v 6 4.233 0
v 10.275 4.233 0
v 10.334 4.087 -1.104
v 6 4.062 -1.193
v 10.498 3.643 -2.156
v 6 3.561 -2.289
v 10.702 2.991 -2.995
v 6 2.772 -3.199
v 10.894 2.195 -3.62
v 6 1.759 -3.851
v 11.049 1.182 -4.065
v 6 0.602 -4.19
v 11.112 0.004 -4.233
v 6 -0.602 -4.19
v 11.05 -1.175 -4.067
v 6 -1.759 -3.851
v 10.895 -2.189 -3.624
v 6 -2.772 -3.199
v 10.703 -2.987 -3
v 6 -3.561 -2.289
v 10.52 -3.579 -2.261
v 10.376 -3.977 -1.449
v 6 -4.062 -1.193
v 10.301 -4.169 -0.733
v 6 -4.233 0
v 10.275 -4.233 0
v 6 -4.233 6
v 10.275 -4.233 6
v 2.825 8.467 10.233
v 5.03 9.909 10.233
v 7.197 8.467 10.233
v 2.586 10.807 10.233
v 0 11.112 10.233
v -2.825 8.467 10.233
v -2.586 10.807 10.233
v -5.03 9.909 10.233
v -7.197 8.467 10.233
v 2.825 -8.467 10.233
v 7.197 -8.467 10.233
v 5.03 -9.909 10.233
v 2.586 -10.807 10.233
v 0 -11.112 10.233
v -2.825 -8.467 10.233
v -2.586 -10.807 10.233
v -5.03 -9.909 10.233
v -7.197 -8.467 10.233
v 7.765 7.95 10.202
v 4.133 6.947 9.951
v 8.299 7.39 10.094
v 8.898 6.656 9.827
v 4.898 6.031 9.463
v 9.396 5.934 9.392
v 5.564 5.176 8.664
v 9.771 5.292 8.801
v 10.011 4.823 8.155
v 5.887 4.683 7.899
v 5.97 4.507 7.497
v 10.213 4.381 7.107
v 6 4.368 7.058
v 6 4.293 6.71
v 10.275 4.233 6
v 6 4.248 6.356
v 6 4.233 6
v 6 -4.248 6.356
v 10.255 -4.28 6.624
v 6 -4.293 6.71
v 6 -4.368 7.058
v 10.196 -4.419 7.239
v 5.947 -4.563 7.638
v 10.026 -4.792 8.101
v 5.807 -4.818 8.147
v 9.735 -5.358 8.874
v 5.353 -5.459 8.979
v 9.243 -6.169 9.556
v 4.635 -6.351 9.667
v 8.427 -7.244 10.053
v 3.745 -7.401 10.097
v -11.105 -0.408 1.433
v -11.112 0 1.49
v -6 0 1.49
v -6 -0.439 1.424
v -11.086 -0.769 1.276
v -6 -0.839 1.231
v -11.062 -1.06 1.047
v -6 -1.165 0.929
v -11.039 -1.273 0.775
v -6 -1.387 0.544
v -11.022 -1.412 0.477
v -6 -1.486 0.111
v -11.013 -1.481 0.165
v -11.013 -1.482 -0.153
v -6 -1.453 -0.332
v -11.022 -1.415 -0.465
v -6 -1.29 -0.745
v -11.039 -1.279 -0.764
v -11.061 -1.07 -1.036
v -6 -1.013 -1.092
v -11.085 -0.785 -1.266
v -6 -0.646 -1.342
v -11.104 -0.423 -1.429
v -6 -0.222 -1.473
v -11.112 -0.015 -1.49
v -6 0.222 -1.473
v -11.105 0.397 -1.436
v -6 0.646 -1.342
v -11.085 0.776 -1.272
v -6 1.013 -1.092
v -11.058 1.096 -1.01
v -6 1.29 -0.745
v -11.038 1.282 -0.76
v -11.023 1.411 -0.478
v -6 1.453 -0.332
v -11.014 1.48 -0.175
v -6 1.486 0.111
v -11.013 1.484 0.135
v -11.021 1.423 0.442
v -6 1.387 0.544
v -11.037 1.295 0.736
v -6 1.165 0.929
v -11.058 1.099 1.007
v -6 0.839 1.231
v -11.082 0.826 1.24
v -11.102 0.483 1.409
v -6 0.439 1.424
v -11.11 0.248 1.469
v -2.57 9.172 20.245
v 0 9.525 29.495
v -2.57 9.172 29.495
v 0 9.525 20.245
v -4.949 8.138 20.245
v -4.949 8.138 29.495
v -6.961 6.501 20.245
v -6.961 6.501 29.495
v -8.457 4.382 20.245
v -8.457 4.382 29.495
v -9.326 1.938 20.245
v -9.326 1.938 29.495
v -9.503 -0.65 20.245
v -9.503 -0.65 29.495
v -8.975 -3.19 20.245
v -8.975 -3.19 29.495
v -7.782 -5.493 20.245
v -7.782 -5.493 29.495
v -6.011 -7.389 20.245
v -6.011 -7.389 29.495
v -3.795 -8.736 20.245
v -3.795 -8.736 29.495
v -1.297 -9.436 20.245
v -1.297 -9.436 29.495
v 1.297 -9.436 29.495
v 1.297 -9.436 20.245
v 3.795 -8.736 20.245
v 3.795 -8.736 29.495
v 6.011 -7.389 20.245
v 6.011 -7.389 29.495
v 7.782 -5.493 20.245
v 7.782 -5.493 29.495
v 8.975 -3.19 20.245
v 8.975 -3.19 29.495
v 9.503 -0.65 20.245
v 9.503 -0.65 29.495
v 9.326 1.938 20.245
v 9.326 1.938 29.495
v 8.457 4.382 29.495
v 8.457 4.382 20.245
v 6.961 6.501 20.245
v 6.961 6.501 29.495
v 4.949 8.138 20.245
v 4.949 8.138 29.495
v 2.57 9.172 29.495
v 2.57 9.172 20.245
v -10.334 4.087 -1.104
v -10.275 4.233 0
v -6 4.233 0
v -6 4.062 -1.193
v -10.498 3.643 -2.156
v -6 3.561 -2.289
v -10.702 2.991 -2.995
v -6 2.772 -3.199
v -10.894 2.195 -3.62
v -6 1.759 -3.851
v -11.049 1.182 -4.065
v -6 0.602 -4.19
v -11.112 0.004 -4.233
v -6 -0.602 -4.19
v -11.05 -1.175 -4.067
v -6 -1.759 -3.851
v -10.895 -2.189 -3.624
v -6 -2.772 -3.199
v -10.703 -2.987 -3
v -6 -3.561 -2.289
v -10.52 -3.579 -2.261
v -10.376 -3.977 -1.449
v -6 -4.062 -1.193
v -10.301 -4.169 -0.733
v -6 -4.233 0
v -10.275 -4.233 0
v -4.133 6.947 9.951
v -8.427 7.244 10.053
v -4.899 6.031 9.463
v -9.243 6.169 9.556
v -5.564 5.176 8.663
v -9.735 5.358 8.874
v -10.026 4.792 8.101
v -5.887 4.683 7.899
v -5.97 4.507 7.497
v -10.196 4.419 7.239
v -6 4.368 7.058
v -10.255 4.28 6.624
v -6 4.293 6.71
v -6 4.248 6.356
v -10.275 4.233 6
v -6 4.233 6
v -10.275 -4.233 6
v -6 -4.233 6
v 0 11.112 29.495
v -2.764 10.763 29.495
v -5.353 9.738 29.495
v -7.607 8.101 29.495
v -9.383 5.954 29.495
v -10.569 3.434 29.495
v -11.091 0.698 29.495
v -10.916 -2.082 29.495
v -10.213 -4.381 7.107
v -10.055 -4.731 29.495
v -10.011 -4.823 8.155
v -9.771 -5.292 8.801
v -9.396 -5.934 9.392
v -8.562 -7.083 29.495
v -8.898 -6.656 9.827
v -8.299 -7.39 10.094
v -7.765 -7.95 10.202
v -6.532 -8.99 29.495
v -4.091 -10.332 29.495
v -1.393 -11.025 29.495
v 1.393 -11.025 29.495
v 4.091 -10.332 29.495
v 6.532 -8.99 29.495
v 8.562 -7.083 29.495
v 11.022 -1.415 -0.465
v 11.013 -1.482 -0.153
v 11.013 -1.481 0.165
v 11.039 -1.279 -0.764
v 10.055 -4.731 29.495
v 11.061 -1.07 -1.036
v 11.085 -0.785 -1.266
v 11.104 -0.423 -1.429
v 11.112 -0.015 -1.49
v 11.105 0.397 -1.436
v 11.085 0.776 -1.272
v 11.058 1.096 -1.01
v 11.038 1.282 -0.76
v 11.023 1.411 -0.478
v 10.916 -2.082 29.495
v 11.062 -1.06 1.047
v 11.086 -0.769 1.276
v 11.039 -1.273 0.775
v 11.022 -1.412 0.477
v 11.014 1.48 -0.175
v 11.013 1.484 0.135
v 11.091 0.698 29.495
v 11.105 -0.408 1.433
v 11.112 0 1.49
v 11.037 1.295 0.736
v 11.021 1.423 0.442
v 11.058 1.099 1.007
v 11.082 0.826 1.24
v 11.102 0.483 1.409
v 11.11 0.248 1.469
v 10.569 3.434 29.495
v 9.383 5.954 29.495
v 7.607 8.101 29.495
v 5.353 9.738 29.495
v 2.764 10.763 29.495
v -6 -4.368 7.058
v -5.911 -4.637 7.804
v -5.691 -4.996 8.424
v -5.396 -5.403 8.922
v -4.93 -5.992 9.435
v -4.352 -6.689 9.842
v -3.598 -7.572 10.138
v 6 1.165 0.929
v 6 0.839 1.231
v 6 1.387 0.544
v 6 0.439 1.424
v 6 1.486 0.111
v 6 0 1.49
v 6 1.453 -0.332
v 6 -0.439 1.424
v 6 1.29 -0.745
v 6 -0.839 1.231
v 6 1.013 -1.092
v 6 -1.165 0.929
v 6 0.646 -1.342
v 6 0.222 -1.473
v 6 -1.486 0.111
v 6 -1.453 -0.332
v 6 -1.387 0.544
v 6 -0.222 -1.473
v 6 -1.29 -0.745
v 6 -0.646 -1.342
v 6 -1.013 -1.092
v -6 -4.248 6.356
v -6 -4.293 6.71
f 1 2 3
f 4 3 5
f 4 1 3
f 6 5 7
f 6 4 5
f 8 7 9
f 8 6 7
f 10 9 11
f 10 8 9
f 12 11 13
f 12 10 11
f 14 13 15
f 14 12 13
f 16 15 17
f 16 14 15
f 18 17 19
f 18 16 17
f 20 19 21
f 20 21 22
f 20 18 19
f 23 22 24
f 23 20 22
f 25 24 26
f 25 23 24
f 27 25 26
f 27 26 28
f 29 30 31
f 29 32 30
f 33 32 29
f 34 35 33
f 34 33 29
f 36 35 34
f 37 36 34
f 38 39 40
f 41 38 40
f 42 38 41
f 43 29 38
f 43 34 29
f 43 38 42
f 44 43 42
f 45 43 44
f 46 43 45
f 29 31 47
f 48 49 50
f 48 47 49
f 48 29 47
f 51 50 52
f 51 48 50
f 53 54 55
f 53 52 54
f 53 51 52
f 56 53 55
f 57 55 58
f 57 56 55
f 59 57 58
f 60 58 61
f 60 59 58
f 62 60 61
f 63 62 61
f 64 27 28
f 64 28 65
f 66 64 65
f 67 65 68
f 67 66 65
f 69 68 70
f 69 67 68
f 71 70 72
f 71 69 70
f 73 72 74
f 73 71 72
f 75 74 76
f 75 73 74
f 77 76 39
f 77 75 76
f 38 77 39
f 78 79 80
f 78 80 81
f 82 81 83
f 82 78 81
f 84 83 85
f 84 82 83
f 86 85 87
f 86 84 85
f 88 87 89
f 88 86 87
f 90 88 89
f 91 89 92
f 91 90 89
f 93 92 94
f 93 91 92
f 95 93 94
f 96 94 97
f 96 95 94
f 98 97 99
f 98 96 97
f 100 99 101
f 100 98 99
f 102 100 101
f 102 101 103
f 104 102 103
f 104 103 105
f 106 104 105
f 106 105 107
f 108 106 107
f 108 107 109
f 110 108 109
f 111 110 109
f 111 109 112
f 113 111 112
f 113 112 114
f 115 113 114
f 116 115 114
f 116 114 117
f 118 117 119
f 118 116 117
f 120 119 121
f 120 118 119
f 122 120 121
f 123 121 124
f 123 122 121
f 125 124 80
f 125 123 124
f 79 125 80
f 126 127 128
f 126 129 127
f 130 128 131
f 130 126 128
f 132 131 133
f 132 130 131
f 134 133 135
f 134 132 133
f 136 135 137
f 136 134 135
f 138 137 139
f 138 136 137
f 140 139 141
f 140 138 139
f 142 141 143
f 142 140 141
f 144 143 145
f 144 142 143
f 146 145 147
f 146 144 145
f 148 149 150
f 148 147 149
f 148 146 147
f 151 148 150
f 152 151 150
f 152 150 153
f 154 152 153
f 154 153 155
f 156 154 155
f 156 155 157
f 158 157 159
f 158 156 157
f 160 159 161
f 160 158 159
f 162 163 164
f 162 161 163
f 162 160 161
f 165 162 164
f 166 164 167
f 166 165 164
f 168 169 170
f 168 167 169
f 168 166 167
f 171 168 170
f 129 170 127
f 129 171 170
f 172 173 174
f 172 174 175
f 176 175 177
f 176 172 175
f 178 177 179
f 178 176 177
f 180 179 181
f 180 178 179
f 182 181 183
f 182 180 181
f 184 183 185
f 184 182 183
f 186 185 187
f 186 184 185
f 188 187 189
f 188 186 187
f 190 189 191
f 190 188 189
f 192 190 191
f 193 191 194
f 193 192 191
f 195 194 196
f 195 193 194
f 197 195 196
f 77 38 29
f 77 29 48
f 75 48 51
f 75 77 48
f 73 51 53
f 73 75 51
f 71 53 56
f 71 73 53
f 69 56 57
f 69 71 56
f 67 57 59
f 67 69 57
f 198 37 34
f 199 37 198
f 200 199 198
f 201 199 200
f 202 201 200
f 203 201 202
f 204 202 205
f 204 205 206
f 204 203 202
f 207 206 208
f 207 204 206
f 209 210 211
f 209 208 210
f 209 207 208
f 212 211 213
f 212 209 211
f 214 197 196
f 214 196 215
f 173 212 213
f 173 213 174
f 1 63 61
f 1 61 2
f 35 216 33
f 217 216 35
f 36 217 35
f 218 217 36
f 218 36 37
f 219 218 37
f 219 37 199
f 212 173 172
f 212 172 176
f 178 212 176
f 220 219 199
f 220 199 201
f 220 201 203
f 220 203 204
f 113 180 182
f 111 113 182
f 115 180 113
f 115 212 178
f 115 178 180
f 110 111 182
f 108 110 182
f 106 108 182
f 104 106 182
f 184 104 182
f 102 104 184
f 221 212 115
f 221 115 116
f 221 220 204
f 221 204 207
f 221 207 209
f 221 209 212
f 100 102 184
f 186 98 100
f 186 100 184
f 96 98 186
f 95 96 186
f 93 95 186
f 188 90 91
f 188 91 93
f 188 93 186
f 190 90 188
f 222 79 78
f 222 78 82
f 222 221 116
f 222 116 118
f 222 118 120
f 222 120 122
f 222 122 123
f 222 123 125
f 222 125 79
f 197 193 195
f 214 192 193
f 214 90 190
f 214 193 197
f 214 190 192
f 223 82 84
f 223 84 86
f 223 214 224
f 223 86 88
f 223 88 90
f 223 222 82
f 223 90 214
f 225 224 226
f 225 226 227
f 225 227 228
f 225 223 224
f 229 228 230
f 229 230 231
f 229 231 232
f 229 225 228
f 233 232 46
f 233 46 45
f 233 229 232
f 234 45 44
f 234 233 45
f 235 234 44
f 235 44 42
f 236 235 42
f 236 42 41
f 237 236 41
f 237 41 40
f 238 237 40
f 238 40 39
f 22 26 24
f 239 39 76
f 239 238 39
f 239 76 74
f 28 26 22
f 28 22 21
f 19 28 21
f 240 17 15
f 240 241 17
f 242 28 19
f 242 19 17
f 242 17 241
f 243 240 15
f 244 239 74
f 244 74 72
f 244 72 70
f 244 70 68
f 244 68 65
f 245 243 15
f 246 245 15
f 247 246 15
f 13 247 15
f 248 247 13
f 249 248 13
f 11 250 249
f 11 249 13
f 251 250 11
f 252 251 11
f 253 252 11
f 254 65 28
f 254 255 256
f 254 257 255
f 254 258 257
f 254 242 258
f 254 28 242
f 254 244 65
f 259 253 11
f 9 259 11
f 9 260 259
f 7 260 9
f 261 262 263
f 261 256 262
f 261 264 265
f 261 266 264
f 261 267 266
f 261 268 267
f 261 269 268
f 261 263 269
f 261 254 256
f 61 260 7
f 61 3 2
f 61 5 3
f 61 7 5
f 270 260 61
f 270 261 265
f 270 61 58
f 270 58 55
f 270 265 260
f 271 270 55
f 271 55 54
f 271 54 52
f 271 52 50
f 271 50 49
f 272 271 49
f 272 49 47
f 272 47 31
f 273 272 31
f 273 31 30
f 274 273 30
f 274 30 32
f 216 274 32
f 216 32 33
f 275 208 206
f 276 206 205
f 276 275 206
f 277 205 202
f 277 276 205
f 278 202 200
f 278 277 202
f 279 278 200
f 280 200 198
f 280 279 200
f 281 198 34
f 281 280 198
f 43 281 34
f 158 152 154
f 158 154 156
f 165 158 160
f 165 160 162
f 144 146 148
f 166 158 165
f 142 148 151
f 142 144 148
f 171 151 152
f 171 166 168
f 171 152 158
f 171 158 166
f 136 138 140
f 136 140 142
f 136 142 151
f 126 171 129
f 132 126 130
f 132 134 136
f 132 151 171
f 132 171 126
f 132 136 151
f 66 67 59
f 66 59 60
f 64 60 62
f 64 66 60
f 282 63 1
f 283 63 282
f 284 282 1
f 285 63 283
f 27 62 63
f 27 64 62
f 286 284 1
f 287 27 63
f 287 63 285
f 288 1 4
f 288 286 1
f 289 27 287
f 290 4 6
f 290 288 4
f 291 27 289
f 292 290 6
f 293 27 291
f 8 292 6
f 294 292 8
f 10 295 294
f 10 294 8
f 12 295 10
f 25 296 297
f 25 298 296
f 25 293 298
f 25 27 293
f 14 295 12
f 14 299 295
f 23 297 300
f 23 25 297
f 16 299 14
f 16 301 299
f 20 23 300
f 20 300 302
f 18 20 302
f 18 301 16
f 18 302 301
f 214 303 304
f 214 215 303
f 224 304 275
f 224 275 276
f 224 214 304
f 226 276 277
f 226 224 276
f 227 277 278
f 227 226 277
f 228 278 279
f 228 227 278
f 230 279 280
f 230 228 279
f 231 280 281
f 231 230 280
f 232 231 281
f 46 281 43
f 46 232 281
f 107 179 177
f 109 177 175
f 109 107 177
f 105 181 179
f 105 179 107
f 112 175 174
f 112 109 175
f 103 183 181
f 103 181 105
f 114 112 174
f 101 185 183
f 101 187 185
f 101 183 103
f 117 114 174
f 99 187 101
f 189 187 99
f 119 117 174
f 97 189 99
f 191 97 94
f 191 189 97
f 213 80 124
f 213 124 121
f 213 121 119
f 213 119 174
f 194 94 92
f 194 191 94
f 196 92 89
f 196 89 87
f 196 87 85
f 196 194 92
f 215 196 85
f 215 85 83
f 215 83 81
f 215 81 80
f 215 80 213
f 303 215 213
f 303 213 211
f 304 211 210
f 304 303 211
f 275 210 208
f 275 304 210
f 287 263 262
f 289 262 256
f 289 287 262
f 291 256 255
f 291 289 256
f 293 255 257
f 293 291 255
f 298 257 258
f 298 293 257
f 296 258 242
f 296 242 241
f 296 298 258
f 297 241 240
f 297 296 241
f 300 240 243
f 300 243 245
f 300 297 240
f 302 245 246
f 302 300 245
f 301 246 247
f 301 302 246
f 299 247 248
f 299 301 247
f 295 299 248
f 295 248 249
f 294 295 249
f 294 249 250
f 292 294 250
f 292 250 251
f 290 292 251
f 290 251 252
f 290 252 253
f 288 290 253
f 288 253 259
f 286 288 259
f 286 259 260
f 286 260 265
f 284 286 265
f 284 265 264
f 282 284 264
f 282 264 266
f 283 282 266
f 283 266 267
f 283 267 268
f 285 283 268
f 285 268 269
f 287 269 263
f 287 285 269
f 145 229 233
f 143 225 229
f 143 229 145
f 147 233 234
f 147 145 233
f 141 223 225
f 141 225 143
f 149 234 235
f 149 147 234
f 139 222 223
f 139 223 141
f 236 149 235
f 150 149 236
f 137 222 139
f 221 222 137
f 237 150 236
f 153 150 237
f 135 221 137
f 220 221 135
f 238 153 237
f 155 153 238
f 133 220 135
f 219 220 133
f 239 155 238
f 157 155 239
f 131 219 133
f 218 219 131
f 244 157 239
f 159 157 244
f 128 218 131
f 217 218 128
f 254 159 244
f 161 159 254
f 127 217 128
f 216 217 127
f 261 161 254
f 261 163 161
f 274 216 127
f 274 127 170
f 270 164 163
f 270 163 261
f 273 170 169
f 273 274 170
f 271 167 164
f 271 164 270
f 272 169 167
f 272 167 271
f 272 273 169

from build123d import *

# Parameters (mm, degrees)
CUT_EXTRUDE1_DEPTH      = 39.29792341
CUT_EXTRUDE1_DEPTH_BACK = 39.29792341
CUT_EXTRUDE2_DEPTH      = 39.297923559
CUT_EXTRUDE2_DEPTH_BACK = 39.297923559
CUT_EXTRUDE3_DEPTH      = 20
CUT_EXTRUDE3_DEPTH_BACK = 10
SKETCH5_R               = 1.49
SKETCH6_R               = 9.525
BOSS_EXTRUDE1_DEPTH     = 4.32
SKETCH7_W               = 30.231147159
SKETCH7_H               = 26.898579755
CUT_EXTRUDE4_DEPTH      = 5.43


with BuildPart() as part:
    # Sketch1 → Revolve1 (revolve)
    with BuildSketch(Plane(origin=(0, 0, 0), x_dir=(0, 0, -1), z_dir=(1, 0, 0))):
        Polygon((-34.925, 11.1125), (-34.925, 9.525), (-15.925, 9.525), (-15.925, 0), (11.1125, 0), (11.1125, 11.1125), align=None)
    revolve(axis=Axis((0, 0, 0), (0, 0, 1)))

    # Sketch3 → Cut-Extrude1 (cut, two sides: drawn at the far end of the back side and taken through both)
    with BuildSketch(Plane(origin=(0, 0, 0), x_dir=(0, 0, -1), z_dir=(1, 0, 0)).offset(-CUT_EXTRUDE1_DEPTH_BACK)):
        with BuildLine():
            Line((11.1125, 11.1125), (-10.233333333, 11.1125))
            Line((-10.233333333, 11.1125), (-10.233333333, 8.466666667))
            ThreePointArc((-10.233333333, 8.466666667), (-8.993418707, 5.47324796), (-6, 4.233333333))
            Line((-6, 4.233333333), (0, 4.233333333))
            ThreePointArc((0, 4.233333333), (4.233333333, 0), (0, -4.233333333))
            Line((0, -4.233333333), (-6, -4.233333333))
            ThreePointArc((-6, -4.233333333), (-8.993418707, -5.47324796), (-10.233333333, -8.466666667))
            Line((-10.233333333, -8.466666667), (-10.233333333, -11.1125))
            Line((-10.233333333, -11.1125), (11.1125, -11.1125))
            Line((11.1125, -11.1125), (11.1125, 11.1125))
        make_face()
    extrude(amount=CUT_EXTRUDE1_DEPTH + CUT_EXTRUDE1_DEPTH_BACK, mode=Mode.SUBTRACT)

    # Sketch4 → Cut-Extrude2 (cut, two sides: drawn at the far end of the back side and taken through both)
    with BuildSketch(Plane(origin=(0, 0, 0), x_dir=(1, 0, 0), z_dir=(0, 1, 0)).offset(-CUT_EXTRUDE2_DEPTH_BACK)):
        with BuildLine():
            Line((-2.825, -10.233333333), (2.825, -10.233333333))
            ThreePointArc((2.825, -10.233333333), (5.07006403, -9.303397364), (6, -7.058333333))
            Line((6, -7.058333333), (6, 4.233333333))
            Line((6, 4.233333333), (-6, 4.233333333))
            Line((-6, 4.233333333), (-6, -7.058333333))
            ThreePointArc((-6, -7.058333333), (-5.07006403, -9.303397364), (-2.825, -10.233333333))
        make_face()
    extrude(amount=CUT_EXTRUDE2_DEPTH + CUT_EXTRUDE2_DEPTH_BACK, mode=Mode.SUBTRACT)

    # Sketch5 → Cut-Extrude3 (cut, two sides: drawn at the far end of the back side and taken through both)
    with BuildSketch(Plane(origin=(-6, 0, 0), x_dir=(0, 0, -1), z_dir=(1, 0, 0)).offset(-CUT_EXTRUDE3_DEPTH_BACK)):
        Circle(SKETCH5_R)
    extrude(amount=CUT_EXTRUDE3_DEPTH + CUT_EXTRUDE3_DEPTH_BACK, mode=Mode.SUBTRACT)

    # Sketch6 → Boss-Extrude1 (add)
    with BuildSketch(Plane.XY.offset(15.925)):
        Circle(SKETCH6_R)
    extrude(amount=BOSS_EXTRUDE1_DEPTH)

    # Sketch7 → Cut-Extrude4 (cut)
    with BuildSketch(Plane.XY.offset(34.925)):
        with Locations((1.508431665, -0.773631718)):
            Rectangle(SKETCH7_W, SKETCH7_H)
    extrude(amount=-CUT_EXTRUDE4_DEPTH, mode=Mode.SUBTRACT)


solid = part.part
